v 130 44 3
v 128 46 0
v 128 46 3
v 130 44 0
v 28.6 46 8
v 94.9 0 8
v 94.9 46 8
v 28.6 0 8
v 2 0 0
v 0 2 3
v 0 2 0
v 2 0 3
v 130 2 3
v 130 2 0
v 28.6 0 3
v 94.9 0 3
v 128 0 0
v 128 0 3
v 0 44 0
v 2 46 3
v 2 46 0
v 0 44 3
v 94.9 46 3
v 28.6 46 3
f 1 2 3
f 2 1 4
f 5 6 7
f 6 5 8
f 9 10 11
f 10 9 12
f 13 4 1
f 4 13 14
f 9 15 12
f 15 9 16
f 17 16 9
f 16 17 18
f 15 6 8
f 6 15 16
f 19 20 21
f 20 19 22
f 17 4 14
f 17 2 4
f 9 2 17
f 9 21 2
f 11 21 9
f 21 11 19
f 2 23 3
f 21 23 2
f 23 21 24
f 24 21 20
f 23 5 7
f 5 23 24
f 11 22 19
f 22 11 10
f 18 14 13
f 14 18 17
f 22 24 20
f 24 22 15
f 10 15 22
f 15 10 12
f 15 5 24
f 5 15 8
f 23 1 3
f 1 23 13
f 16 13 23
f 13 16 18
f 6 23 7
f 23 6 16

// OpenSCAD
$fn = 32;

// ----------------------------------------------------------------------
// Stepped bar: centerstep, 130 x 46 x 8/3 mm
// ----------------------------------------------------------------------

// --- parameters (mm) ---
bar_l = 130;              // bar length, X
bar_w = 46;               // bar width, Y
plate_t = 8;              // thickness of the thick zone, Z
thin_t = 3;               // thickness of the thin zone
corner_c = 2;             // corner chamfer of the bar
step_cut = 5;             // material removed from the thin zone
thick_from = 28.6;        // start of the thick middle zone
thick_to = 94.9;          // end of the thick middle zone
depth_1 = 5;              // depth of cut 1 from the top face
depth_2 = 5;              // depth of cut 2 from the top face

profile = [[2, 0], [128, 0], [130, 2], [130, 44], [128, 46], [2, 46], [0, 44], [0, 2]];  // primary outline, 8 points, counter clockwise
void_1 = [[-1, -1], [28.6, -1], [28.6, 47], [-1, 47]];  // thin left end, 4 points
void_2 = [[94.9, -1], [131, -1], [131, 47], [94.9, 47]];  // thin right end, 4 points

// --- the one profile operation ---
difference() {
  linear_extrude(height = plate_t) polygon(points = profile);
  translate([0, 0, plate_t - depth_1])
    linear_extrude(height = depth_1 + 1) polygon(points = void_1);
  translate([0, 0, plate_t - depth_2])
    linear_extrude(height = depth_2 + 1) polygon(points = void_2);
}
